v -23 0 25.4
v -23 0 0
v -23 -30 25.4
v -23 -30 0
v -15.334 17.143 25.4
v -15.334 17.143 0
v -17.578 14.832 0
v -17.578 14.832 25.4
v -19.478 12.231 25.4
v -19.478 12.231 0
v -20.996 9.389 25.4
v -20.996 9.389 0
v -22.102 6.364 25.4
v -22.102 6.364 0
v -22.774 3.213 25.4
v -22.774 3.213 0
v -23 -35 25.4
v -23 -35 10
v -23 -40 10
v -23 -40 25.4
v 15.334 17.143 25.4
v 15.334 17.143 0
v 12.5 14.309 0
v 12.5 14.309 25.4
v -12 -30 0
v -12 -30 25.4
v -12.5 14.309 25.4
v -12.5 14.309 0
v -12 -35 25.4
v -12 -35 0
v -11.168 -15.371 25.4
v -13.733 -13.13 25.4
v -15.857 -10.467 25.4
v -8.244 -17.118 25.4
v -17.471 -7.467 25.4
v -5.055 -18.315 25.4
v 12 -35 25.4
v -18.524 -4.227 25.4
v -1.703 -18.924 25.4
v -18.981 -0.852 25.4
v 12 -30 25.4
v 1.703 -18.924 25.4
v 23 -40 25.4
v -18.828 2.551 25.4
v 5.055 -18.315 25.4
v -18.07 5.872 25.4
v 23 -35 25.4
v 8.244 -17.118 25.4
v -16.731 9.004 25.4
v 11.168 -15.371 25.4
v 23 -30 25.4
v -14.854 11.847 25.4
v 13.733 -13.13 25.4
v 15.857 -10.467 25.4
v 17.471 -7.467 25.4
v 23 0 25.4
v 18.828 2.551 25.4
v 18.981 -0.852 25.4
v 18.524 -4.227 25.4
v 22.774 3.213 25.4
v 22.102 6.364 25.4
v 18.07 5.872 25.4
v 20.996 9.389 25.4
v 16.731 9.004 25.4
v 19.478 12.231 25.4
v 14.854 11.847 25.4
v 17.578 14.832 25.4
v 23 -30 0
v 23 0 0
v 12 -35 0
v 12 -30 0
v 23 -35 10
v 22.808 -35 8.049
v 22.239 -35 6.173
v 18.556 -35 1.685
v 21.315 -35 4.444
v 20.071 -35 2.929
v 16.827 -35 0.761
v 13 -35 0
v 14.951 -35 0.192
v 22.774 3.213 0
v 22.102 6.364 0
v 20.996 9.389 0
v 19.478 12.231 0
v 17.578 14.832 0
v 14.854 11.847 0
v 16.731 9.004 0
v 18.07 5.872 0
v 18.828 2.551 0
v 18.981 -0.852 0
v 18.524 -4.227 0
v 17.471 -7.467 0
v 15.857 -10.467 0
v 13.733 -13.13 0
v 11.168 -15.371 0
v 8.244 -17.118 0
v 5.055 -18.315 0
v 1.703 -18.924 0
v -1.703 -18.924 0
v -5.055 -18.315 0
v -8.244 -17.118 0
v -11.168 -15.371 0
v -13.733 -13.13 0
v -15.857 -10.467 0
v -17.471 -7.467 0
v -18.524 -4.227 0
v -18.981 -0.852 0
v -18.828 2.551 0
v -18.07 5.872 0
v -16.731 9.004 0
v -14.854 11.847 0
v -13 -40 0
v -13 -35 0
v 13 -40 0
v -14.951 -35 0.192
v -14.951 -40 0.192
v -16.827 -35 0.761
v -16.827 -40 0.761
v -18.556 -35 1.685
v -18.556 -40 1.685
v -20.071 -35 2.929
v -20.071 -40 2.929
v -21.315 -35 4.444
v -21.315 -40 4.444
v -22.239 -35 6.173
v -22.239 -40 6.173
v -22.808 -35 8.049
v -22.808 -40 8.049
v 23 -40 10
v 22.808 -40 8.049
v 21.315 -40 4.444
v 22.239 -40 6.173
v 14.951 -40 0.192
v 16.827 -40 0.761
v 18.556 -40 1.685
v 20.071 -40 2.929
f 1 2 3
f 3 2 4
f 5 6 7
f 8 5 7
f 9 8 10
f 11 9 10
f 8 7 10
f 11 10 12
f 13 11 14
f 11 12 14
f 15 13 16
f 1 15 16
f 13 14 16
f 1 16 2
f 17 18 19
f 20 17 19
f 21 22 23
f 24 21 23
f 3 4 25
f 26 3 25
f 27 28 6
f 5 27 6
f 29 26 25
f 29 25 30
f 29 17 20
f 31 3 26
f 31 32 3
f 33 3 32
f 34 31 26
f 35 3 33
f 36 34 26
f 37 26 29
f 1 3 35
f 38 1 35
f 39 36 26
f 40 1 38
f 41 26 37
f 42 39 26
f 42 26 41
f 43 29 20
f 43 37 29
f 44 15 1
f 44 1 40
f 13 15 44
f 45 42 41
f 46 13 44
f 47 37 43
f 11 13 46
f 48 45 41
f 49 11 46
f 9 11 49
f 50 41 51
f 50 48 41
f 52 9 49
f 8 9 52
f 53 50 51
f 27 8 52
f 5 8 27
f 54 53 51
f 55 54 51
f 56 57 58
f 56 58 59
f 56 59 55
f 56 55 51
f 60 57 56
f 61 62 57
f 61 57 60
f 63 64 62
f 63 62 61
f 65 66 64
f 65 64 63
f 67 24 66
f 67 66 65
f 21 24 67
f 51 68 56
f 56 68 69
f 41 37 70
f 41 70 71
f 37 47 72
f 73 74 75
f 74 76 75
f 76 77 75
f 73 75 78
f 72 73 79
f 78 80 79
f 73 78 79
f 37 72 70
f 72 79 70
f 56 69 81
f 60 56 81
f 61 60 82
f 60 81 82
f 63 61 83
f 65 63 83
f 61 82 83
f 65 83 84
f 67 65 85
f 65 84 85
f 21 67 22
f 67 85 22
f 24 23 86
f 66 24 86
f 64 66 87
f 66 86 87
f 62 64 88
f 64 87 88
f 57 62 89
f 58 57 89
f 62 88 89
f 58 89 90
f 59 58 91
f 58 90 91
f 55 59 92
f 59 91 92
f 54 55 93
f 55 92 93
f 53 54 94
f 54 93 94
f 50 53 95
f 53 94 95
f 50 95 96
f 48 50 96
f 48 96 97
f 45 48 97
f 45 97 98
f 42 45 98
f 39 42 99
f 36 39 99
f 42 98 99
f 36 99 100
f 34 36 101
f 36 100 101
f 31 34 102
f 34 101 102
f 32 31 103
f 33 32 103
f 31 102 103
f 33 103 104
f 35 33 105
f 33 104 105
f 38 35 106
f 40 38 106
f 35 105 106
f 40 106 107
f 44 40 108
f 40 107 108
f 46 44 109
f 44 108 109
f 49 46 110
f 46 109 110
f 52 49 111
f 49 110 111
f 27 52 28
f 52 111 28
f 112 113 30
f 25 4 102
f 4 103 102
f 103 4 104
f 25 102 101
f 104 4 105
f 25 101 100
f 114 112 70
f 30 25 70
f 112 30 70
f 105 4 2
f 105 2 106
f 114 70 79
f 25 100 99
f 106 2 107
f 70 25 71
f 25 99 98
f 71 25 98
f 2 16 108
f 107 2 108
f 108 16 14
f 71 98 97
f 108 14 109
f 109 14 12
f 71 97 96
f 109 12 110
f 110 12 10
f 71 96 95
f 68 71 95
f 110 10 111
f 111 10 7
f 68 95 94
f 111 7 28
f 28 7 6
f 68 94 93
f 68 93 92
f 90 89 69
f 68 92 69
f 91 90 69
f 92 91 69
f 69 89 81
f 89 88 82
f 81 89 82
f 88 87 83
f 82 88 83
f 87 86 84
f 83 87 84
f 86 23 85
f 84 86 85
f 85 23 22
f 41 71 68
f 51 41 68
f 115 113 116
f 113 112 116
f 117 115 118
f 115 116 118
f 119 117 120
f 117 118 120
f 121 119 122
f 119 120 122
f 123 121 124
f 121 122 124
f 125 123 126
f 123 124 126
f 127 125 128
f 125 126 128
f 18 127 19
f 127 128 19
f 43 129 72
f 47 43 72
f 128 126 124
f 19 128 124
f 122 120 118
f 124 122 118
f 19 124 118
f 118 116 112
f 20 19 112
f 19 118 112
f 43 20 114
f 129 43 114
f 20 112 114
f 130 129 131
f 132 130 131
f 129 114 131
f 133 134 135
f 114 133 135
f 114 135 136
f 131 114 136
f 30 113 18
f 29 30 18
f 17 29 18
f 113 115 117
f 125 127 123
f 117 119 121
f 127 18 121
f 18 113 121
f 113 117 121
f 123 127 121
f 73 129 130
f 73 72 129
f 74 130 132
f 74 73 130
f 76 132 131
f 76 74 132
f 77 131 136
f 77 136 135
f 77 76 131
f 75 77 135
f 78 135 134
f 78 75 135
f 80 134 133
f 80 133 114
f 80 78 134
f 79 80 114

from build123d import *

# Parameters (mm, degrees)
F1_DEPTH = 25.4
F2_R     = 10
F3_R     = 10


with BuildPart() as f1:
    # F0 (on Top) → F1 (new body)
    with BuildSketch(Plane.XY):
        with BuildLine():
            ThreePointArc((12.5, 14.309088), (0, -19), (-12.5, 14.309088))
            Line((-12.5, 14.309088), (-15.333738, 17.142826))
            ThreePointArc((-15.333738, 17.142826), (-20.996142, 9.389463), (-23, 0))
            Line((-23, 0), (-23, -30))
            Line((-23, -30), (-12, -30))
            Line((-12, -30), (-12, -35))
            Line((-12, -35), (-23, -35))
            Line((-23, -35), (-23, -40))
            Line((-23, -40), (23, -40))
            Line((23, -40), (23, -35))
            Line((23, -35), (12, -35))
            Line((12, -35), (12, -30))
            Line((12, -30), (23, -30))
            Line((23, -30), (23, 0))
            ThreePointArc((23, 0), (20.996142, 9.389463), (15.333738, 17.142826))
            Line((15.333738, 17.142826), (12.5, 14.309088))
        make_face()
    extrude(amount=F1_DEPTH)

    # F2
    f2_edges = [f1.edges().sort_by_distance(p)[0] for p in [
        (23, -37.5, 0),
    ]]
    fillet(f2_edges, radius=F2_R)

    # F3
    f3_edges = [f1.edges().sort_by_distance(p)[0] for p in [
        (-23, -37.5, 0),
    ]]
    fillet(f3_edges, radius=F3_R)


solid = f1.part
